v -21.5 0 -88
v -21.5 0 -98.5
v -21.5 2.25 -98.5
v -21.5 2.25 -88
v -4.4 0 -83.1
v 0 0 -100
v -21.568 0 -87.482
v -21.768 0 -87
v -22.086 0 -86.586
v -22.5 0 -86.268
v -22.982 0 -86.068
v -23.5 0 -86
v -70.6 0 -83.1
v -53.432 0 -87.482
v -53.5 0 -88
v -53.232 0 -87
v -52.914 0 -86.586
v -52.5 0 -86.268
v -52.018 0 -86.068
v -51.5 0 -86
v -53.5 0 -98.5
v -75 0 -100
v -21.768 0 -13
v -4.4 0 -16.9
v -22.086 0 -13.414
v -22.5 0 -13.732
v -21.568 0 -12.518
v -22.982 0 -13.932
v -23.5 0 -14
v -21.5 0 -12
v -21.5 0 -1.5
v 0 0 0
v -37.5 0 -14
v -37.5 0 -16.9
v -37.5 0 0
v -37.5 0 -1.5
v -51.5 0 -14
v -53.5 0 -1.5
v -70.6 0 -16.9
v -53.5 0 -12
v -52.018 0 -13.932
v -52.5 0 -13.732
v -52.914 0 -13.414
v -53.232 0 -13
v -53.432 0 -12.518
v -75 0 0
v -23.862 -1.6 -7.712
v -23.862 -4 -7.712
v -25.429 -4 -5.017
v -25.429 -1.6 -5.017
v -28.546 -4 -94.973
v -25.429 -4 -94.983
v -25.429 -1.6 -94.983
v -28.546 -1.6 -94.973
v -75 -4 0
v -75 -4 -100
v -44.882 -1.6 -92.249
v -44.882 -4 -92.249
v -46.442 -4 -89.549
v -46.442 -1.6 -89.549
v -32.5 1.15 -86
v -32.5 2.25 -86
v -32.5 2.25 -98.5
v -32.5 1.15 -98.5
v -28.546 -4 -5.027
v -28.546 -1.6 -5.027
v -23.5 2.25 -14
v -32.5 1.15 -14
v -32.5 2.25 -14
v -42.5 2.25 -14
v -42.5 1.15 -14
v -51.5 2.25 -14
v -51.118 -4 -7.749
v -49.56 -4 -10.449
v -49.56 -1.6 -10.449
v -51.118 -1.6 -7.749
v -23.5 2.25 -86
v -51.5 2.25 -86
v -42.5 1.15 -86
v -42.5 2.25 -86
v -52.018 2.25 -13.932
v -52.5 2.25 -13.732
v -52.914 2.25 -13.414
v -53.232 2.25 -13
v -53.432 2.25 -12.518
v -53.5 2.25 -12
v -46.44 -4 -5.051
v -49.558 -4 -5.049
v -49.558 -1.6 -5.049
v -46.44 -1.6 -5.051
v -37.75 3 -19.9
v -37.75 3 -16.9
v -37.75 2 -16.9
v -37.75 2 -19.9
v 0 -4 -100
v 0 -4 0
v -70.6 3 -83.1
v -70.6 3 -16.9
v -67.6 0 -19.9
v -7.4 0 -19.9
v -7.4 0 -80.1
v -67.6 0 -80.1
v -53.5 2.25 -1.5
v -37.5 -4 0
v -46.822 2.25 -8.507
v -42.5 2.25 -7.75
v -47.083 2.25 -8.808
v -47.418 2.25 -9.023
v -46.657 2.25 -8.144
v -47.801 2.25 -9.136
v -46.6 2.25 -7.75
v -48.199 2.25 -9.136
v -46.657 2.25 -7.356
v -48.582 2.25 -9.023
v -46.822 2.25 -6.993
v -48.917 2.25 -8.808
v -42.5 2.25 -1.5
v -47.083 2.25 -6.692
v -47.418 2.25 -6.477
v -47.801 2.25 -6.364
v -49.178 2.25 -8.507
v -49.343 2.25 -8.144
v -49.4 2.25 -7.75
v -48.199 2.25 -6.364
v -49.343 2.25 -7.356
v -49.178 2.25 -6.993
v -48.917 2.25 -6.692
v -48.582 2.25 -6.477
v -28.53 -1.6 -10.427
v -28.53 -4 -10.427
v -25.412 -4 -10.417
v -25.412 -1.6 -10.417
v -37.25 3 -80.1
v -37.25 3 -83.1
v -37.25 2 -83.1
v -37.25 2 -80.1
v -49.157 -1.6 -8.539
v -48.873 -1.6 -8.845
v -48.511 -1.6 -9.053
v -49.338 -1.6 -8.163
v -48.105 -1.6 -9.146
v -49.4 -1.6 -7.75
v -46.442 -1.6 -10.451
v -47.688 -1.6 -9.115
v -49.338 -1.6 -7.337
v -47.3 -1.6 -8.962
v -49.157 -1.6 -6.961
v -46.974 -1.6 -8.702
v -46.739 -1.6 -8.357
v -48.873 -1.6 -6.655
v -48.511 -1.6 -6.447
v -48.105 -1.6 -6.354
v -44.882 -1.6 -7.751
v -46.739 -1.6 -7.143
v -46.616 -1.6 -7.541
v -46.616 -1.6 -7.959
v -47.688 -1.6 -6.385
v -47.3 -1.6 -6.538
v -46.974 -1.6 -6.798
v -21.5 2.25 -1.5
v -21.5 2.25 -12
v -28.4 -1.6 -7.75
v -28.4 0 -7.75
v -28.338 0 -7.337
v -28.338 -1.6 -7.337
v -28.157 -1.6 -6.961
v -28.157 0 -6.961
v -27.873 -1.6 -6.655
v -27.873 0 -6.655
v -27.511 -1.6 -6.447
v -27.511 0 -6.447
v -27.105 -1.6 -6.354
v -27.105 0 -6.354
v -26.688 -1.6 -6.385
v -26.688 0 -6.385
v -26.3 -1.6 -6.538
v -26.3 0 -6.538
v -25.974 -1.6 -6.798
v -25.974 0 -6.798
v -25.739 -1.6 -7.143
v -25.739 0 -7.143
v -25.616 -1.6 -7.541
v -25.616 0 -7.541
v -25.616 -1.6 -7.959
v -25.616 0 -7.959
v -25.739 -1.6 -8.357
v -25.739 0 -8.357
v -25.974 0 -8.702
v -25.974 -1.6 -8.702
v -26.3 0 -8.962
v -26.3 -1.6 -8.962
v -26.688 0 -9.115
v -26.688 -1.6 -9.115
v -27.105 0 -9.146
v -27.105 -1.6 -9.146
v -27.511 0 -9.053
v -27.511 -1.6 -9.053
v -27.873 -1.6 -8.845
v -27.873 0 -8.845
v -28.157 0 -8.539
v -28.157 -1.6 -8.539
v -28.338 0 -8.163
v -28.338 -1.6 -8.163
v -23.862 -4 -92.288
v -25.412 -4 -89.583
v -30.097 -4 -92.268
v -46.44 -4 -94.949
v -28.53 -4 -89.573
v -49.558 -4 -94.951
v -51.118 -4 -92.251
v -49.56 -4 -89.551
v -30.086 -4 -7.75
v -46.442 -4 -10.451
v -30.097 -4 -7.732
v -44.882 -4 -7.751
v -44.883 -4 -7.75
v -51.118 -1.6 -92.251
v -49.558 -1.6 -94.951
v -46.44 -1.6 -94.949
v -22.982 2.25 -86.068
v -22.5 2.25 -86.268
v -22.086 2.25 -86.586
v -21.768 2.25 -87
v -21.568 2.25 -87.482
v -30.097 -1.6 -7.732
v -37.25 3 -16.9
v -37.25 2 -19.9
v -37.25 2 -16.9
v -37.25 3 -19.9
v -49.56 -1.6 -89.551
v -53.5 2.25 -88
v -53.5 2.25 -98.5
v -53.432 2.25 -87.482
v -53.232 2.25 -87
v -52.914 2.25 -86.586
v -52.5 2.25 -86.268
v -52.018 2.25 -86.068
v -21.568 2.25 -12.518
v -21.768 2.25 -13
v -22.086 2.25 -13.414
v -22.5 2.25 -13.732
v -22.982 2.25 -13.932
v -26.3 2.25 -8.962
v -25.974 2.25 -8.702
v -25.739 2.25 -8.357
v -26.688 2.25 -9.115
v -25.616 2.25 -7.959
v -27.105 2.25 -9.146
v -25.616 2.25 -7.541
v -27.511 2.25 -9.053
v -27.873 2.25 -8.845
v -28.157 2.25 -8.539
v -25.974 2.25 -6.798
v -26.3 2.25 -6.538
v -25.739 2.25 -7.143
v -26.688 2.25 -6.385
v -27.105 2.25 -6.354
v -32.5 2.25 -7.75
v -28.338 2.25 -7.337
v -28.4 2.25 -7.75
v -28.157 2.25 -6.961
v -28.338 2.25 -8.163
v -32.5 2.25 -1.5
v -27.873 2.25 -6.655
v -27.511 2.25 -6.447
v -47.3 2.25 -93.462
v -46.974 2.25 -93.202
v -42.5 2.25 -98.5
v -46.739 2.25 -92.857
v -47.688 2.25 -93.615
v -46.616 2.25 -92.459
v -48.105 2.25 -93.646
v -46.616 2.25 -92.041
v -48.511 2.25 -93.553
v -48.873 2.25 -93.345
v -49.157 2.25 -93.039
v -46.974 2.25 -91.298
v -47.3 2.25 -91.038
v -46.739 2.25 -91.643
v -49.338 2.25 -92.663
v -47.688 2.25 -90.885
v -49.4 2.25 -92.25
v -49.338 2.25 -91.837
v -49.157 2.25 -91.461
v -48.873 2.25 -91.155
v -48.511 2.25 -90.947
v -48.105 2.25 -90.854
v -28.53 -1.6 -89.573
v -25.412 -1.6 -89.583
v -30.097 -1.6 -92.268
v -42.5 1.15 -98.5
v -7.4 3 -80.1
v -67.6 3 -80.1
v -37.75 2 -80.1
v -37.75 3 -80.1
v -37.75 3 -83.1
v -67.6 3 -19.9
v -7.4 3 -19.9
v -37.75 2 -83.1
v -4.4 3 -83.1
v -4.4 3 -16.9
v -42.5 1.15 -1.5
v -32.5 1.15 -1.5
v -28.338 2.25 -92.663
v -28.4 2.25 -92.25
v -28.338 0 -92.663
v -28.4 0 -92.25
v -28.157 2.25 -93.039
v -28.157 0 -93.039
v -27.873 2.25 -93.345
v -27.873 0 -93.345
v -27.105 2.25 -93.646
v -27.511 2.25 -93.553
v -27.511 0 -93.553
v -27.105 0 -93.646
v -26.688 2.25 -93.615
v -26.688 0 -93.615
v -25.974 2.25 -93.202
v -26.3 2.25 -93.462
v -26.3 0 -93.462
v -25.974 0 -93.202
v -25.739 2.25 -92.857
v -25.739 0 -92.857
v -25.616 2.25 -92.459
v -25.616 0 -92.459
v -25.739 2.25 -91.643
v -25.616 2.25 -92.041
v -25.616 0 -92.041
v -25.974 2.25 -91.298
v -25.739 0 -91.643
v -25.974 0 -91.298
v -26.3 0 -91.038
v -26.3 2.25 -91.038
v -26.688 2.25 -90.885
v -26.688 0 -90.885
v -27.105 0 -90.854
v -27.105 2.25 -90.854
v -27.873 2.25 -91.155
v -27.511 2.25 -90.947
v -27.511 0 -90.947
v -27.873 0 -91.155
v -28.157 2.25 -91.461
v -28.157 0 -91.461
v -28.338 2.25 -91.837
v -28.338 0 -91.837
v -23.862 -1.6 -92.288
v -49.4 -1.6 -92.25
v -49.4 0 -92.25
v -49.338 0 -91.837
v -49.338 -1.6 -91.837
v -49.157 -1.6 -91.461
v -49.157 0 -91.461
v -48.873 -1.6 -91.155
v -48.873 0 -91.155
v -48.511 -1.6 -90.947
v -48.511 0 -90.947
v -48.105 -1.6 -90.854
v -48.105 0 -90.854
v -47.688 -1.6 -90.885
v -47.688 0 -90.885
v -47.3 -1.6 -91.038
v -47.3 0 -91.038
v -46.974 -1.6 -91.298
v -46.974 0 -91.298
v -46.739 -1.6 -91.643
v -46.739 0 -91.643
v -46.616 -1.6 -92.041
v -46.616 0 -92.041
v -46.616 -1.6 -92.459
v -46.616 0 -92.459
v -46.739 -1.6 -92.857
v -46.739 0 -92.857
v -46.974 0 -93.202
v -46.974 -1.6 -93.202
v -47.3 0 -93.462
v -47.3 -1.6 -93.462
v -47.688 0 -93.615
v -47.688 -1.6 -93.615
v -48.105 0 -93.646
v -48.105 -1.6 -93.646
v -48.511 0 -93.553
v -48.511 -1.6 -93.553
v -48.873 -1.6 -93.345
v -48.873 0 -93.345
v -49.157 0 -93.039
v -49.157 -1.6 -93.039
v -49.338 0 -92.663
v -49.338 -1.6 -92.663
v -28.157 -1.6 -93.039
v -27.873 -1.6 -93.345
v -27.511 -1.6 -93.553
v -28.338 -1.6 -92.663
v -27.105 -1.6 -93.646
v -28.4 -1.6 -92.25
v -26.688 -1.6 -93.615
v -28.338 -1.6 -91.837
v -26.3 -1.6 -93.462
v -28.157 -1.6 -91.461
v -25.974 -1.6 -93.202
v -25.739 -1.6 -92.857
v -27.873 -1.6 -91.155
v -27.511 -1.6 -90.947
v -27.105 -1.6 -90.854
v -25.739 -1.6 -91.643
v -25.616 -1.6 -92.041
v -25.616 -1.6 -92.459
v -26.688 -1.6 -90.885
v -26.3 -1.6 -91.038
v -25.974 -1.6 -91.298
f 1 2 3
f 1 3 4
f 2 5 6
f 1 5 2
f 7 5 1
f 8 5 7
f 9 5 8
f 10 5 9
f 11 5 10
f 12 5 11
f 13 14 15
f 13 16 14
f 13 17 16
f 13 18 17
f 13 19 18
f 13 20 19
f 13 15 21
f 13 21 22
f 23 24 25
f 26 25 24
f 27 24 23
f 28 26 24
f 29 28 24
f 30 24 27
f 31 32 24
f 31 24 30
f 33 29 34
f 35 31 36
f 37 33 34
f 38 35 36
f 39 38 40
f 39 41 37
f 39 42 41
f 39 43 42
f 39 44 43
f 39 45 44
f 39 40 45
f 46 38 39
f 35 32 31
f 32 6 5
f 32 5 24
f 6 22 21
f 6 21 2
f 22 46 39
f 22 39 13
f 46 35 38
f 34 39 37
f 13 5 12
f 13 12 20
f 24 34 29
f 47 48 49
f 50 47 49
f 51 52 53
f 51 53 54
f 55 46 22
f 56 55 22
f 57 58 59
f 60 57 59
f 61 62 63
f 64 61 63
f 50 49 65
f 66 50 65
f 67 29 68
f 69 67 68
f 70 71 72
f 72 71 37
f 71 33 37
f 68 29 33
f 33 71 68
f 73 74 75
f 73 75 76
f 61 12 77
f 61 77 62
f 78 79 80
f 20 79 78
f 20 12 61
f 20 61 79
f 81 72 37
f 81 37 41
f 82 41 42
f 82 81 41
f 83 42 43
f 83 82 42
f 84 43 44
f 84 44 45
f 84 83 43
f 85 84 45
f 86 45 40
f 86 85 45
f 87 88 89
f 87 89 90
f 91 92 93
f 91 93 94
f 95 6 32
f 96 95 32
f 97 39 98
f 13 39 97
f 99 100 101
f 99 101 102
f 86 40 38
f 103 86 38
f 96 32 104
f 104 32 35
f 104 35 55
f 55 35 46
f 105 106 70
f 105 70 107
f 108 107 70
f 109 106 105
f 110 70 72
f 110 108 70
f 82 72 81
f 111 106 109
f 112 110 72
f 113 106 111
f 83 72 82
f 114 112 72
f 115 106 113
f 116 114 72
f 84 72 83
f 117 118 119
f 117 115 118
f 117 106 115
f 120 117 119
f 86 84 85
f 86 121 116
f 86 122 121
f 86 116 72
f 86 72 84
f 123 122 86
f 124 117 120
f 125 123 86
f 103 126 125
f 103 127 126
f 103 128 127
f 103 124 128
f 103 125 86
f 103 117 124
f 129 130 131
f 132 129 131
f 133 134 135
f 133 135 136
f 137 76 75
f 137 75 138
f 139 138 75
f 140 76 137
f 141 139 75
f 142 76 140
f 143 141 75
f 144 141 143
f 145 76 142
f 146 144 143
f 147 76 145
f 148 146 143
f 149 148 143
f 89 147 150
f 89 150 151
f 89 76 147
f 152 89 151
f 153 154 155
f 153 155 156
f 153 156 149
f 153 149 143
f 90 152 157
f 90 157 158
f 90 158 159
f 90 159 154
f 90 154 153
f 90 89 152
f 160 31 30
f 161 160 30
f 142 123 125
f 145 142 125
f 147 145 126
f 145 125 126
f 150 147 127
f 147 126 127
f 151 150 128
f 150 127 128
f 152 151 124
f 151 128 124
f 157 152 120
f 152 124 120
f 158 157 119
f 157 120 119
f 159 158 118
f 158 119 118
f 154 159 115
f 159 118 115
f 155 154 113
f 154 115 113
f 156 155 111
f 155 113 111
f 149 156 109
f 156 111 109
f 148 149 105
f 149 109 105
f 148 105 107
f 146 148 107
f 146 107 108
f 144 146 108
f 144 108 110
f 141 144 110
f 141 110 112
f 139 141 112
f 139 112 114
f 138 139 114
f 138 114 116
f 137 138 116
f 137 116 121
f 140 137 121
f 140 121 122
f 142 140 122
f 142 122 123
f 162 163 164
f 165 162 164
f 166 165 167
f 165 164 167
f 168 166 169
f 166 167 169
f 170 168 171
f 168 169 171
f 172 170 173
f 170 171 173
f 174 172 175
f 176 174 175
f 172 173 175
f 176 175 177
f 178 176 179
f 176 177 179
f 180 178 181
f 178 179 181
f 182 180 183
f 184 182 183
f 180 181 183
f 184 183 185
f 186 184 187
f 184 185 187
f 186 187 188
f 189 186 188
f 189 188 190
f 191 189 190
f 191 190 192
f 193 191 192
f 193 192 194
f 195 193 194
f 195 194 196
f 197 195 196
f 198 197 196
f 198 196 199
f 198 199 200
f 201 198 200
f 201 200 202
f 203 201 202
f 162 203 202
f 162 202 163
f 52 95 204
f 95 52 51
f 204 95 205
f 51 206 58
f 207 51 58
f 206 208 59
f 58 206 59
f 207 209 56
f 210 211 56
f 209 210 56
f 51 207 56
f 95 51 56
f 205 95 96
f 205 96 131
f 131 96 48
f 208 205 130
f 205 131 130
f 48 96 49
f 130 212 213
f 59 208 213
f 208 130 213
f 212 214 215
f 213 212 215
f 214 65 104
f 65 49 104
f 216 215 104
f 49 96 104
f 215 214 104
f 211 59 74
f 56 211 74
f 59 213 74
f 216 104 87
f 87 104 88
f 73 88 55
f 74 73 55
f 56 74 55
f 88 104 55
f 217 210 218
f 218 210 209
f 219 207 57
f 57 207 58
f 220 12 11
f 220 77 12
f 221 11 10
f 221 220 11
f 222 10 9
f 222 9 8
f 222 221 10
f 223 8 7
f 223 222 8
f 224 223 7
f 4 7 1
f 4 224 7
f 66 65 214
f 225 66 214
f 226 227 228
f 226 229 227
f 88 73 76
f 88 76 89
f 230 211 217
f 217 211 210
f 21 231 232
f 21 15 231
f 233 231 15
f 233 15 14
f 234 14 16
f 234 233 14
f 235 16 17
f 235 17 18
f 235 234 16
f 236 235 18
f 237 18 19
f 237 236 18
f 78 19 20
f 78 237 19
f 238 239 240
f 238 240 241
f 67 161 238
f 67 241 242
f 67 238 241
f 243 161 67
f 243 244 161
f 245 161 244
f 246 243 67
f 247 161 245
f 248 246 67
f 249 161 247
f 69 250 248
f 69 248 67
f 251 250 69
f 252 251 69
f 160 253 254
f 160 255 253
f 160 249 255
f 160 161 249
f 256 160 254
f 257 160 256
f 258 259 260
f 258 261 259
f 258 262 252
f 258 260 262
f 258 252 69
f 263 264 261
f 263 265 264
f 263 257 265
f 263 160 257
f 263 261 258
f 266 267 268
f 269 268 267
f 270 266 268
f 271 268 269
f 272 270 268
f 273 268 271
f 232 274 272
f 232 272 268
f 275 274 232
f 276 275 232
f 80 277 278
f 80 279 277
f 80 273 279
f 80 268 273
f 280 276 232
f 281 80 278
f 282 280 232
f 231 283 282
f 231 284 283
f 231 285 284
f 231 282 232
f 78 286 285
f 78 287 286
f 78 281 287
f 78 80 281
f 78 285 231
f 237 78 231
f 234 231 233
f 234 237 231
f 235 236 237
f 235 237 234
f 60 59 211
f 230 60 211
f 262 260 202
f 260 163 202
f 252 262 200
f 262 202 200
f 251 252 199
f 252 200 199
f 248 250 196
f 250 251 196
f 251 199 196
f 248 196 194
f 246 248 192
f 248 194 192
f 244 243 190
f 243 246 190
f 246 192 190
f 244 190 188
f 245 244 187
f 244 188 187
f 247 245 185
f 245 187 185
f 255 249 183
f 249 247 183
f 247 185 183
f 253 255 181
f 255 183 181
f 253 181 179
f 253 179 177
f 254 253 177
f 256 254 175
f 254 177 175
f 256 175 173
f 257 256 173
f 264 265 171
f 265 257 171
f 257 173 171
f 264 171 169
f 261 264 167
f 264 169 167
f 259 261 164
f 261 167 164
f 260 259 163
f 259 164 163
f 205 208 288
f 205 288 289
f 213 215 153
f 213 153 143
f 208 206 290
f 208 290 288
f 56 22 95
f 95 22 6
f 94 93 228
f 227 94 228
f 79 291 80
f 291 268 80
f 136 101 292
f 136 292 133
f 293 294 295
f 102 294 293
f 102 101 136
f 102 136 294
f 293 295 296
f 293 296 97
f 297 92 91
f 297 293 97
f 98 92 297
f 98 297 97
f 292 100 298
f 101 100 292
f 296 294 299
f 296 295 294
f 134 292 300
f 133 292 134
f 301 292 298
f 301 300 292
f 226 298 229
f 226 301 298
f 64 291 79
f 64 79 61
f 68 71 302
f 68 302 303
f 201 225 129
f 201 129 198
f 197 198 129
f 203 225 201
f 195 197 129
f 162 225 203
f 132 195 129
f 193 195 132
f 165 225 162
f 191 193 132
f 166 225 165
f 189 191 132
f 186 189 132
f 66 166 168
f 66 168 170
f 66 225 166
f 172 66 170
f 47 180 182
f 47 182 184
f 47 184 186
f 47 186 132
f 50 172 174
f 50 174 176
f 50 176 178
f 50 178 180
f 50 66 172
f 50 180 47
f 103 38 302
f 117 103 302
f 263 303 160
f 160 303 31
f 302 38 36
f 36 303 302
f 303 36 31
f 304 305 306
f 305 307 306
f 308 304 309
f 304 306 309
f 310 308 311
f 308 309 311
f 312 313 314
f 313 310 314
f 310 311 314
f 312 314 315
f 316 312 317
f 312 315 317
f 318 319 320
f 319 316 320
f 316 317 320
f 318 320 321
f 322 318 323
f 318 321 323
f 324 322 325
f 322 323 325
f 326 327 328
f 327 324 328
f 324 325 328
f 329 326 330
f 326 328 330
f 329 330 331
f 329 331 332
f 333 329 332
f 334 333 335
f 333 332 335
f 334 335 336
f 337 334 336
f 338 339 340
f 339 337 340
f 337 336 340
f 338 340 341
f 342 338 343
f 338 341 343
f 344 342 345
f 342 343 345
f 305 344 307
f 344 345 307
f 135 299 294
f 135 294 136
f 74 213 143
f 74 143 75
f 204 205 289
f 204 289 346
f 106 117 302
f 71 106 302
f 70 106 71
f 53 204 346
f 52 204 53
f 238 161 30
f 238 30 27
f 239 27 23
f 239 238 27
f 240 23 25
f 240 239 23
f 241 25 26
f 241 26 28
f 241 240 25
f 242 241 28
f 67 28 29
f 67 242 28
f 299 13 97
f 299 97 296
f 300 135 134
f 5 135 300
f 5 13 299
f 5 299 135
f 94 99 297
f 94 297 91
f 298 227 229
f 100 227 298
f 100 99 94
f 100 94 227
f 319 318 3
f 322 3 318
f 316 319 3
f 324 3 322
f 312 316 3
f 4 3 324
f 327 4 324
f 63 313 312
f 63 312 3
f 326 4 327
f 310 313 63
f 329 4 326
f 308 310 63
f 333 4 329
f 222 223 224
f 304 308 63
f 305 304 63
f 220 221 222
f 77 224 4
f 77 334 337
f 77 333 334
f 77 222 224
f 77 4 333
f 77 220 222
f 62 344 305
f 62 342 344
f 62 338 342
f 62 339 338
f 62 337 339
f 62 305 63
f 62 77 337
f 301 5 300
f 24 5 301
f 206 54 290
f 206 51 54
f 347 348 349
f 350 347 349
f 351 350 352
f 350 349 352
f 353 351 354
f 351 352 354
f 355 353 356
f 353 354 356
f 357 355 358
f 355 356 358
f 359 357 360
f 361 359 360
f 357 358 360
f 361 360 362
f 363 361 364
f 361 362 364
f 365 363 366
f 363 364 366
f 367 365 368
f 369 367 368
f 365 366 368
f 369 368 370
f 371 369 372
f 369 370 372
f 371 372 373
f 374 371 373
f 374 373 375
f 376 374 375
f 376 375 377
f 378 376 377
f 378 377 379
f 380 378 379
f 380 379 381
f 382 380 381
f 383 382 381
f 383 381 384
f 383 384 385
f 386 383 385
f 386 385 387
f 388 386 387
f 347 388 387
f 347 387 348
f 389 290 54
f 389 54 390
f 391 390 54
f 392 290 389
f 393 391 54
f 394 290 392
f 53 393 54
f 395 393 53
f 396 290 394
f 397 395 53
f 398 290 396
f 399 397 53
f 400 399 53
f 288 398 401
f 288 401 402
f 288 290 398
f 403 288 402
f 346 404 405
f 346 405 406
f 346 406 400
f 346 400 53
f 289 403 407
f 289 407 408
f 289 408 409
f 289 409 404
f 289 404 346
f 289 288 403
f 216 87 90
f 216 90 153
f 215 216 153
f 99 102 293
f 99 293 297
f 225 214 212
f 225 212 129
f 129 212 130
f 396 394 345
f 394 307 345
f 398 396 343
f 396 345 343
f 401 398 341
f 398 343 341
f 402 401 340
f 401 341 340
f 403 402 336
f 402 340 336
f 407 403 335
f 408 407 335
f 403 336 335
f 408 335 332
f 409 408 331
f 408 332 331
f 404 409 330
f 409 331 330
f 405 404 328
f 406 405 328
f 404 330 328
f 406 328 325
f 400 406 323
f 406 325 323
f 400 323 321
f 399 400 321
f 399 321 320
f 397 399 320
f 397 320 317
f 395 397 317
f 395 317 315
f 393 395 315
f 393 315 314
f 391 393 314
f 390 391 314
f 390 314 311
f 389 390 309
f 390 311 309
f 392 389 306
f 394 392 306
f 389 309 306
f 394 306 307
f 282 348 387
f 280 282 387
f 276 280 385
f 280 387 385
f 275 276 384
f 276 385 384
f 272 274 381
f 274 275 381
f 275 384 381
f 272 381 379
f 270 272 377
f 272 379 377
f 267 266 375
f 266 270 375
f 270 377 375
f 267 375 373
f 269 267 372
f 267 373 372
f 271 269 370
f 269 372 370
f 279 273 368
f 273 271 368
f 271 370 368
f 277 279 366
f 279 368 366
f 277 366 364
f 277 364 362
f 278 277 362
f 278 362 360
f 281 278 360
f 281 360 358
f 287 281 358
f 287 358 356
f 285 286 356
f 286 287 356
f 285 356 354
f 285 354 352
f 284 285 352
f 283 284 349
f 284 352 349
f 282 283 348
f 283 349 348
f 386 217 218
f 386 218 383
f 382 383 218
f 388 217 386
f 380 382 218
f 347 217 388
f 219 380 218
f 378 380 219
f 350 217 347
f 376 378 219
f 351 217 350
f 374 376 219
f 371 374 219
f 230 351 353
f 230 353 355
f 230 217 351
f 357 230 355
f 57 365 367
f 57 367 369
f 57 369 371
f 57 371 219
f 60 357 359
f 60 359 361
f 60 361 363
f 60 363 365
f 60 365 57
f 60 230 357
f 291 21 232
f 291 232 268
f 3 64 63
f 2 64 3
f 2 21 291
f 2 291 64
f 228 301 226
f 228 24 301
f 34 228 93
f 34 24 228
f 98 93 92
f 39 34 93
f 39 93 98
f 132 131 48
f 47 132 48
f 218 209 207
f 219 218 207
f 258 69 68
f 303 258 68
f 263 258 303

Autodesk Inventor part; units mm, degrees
ref_plane "YZ Plane" through (0, 0, 0) normal (1, 0, 0) x (0, 1, 0)
ref_plane "XZ Plane" through (0, 0, 0) normal (0, 1, 0) x (-1, 0, 0)
ref_plane "XY Plane" through (0, 0, 0) normal (0, 0, 1) x (1, 0, 0)
sketch "Boceto1" plane through (0, 0, 0) normal (0, 1, 0) x (-1, 0, 0)
  line L0 (0, 0) -> (75, 0)
  line L1 (75, 0) -> (75, -100)
  line L2 (75, -100) -> (0, -100)
  line L3 (0, -100) -> (0, 0)
  line L4 (7.4, -80.1) -> (67.6, -80.1)
  line L5 (67.6, -80.1) -> (67.6, -19.9)
  line L6 (67.6, -19.9) -> (7.4, -19.9)
  line L7 (7.4, -19.9) -> (7.4, -80.1)
  line L8 (7.4, -80.1) -> (67.6, -19.9) construction
  line L9 (67.6, -80.1) -> (7.4, -19.9) construction
  line L10 (70.6, -16.9) -> (70.6, -83.1)
  line L11 (70.6, -83.1) -> (4.4, -83.1)
  line L12 (4.4, -83.1) -> (4.4, -16.9)
  line L13 (4.4, -16.9) -> (70.6, -16.9)
  line L14 (53.5, -1.5) -> (21.5, -1.5)
  line L15 (21.5, -1.5) -> (21.5, -14)
  line L16 (21.5, -14) -> (53.5, -14)
  line L17 (53.5, -14) -> (53.5, -1.5)
  line L18 (67.6, -50) -> (7.4, -50) construction
  line L19 (53.5, -7.75) -> (48, -7.75) construction
  line L20 (48, -7.75) -> (27, -7.75) construction
  line L21 (27, -7.75) -> (21.5, -7.75) construction
  circle A0 centre (48, -7.75) radius 1.4
  circle A1 centre (27, -7.75) radius 1.4
  line L22 (53.5, -98.5) -> (21.5, -98.5)
  line L23 (21.5, -98.5) -> (21.5, -86)
  line L24 (21.5, -86) -> (53.5, -86)
  line L25 (53.5, -86) -> (53.5, -98.5)
  circle A2 centre (48, -92.25) radius 1.4
  circle A3 centre (27, -92.25) radius 1.4
  line L26 (58.4347, 0) -> (58.4347, -14) construction
  line L27 (68.2, -14.5) -> (75, -14.5) construction
  line L28 (37.5, -19.9) -> (37.5, -80.1) construction
  circle A4 centre (48, -92.25) radius 1.4
  line L29 (48, -7.75) -> (27, -7.75)
  line L30 (37.5, -1.5) -> (37.5, 0)
  line L31 (37.5, -1.5) -> (37.5, -50)
  point P0 (37.5, -14)
  point P1 (37.5, -16.9)
  point P2 (37.5, -98.5)
  point P3 (37.5, -100)
  dimension "d0" = 100
  dimension "d1" = 75
  dimension "d2" = 60.2
  dimension "d3" = 60.2
  dimension "d4" = 3
  dimension "d5" = 12.5
  dimension "d6" = 32
  dimension "d8" = 5.5
  dimension "d9" = 5.5
  dimension "d10" = 2.8
  dimension "d11" = 2.8
  dimension "d14" = 14
  dimension "d32" = 1.5
  dimension "d36" = 1.5
extrude "Extrusión1" add sketch "Boceto1" along normal blind 3 contours L13 L10 L11 L12
extrude "Extrusión2" add sketch "Boceto1" against normal blind 4 contours L14 L17 L16 L31 | L31 L16 L15 L14 | L0 L1 L2 L3 | L22 L23 L24 L25
extrude "Extrusión3" add sketch "Boceto1" along normal blind 2.25 contours L14 L17 L16 L31 | L31 L16 L15 L14 | L22 L23 L24 L25
sketch "Boceto2" plane through (0, 2.25, 0) normal (0, 1, 0) x (1, 0, 0)
  line L0 (-53.5, 1.5) -> (-21.5, 1.5) projected
  line L1 (-37.5, 1.5) -> (-37.5, 14)
  line L2 (-21.5, 14) -> (-53.5, 14) projected
  line L3 (-32.5, 1.5) -> (-42.5, 1.5)
  line L4 (-42.5, 1.5) -> (-42.5, 14)
  line L5 (-42.5, 14) -> (-32.5, 14)
  line L6 (-32.5, 14) -> (-32.5, 1.5)
  line L7 (-32.5, 1.5) -> (-42.5, 14) construction
  line L8 (-42.5, 1.5) -> (-32.5, 14) construction
  line L9 (-67.6, 50) -> (-7.4, 50) construction
  line L10 (-53.5, 98.5) -> (-21.5, 98.5)
  line L11 (-21.5, 86) -> (-53.5, 86)
  line L12 (-42.5, 98.5) -> (-42.5, 86)
  line L13 (-32.5, 86) -> (-32.5, 98.5)
  point P0 (0, 0)
  point P1 (-37.5, 7.75)
  point P2 (-42.5, 98.5)
  point P3 (-42.5, 1.5)
  point P4 (-32.5, 1.5)
  point P5 (-32.5, 14)
  dimension "d22" = 10
extrude "Extrusión4" cut sketch "Boceto2" against normal blind 1.1
extrude "Extrusión5" add sketch "Boceto1" against normal blind 4 contours L6 L5 L4 L7 | L13 L10 L11 L12
sketch "Boceto3" plane through (0, 3, 0) normal (0, 1, 0) x (1, 0, 0)
  line L0 (-37.5, 19.9) -> (-37.5, 80.1) construction
  line L1 (-70.6, 16.9) -> (-4.4, 16.9) projected
  line L2 (-37.5, 16.9) -> (-37.5, 83.1)
  line L3 (-4.4, 83.1) -> (-70.6, 83.1) projected
  line L4 (-37.25, 16.9) -> (-37.75, 16.9)
  line L5 (-37.75, 16.9) -> (-37.75, 83.1)
  line L6 (-37.75, 83.1) -> (-37.25, 83.1)
  line L7 (-37.25, 83.1) -> (-37.25, 16.9)
  line L8 (-37.25, 16.9) -> (-37.75, 83.1) construction
  line L9 (-37.75, 16.9) -> (-37.25, 83.1) construction
  point P0 (0, 0)
  point P1 (-37.5, 50)
  point P2 (-37.25, 16.9)
  point P3 (-37.25, 83.1)
  point P4 (-37.75, 16.9)
  dimension "d27" = 0.5
extrude "Extrusión6" cut sketch "Boceto3" against normal blind 1
sketch "Boceto4" plane through (-53.5, 0, -1.5) normal (0, 0, 1) x (1, 0, 0)
  line L0 (16.25, 2) -> (15.75, 2) projected
  line L1 (21, 1.15) -> (11, 1.15) projected
  line L2 (-21.5, 0) -> (53.5, 0) projected
  line L3 (15.75, 2) -> (15.75, 3) projected
fillet "Empalme1" radius 2 4 edges at (-53.5, 1.125, -86) (-21.5, 1.125, -86) (-21.5, 1.125, -14) (-53.5, 1.125, -14)
sketch "Boceto5" plane through (-53.5, 0, -1.5) normal (0, 0, 1) x (1, 0, 0)
  line L0 (16.25, 2) -> (15.75, 2) projected
  line L1 (21, 1.15) -> (11, 1.15) projected
  point P0 (53.5, 0)
sketch "Boceto6" plane through (0, -4, 0) normal (0, -1, 0) x (1, 0, 0)
  line L0 (-27, -7.75) -> (-21.5, -7.75) construction
  circle A0 centre (-48, -7.75) radius 1.4 projected
  line L1 (-46.4401, -5.0506) -> (-44.8823, -7.7512)
  line L2 (-44.8823, -7.7512) -> (-46.4422, -10.4506)
  line L3 (-46.4422, -10.4506) -> (-49.5599, -10.4494)
  line L4 (-49.5599, -10.4494) -> (-51.1177, -7.7488)
  line L5 (-51.1177, -7.7488) -> (-49.5578, -5.0494)
  line L6 (-49.5578, -5.0494) -> (-46.4401, -5.0506)
  line L7 (0, 0) -> (-75, 0) projected
  line L8 (-37.5, 0) -> (-37.3669, -100)
  line L9 (0, -100) -> (-75, -100) projected
  line L10 (-75, 0) -> (-75, -100) projected
  line L11 (-75, -50) -> (0, -50)
  line L12 (0, -100) -> (0, 0) projected
  line L13 (-28.5465, -5.0268) -> (-30.0971, -7.7316)
  line L14 (-30.0971, -7.7316) -> (-28.53, -10.4268)
  line L15 (-28.53, -10.4268) -> (-25.4123, -10.4172)
  line L16 (-25.4123, -10.4172) -> (-23.8617, -7.7125)
  line L17 (-23.8617, -7.7125) -> (-25.4288, -5.0172)
  line L18 (-25.4288, -5.0172) -> (-28.5465, -5.0268)
  line L19 (-46.4401, -94.9494) -> (-44.8823, -92.2488)
  line L20 (-44.8823, -92.2488) -> (-46.4422, -89.5494)
  line L21 (-46.4422, -89.5494) -> (-49.5599, -89.5506)
  line L22 (-49.5599, -89.5506) -> (-51.1177, -92.2512)
  line L23 (-51.1177, -92.2512) -> (-49.5578, -94.9506)
  line L24 (-49.5578, -94.9506) -> (-46.4401, -94.9494)
  line L25 (-23.8617, -92.2875) -> (-25.4288, -94.9828)
  line L26 (-25.4288, -94.9828) -> (-28.5465, -94.9732)
  line L27 (-28.5465, -94.9732) -> (-30.0971, -92.2684)
  line L28 (-30.0971, -92.2684) -> (-28.53, -89.5732)
  line L29 (-28.53, -89.5732) -> (-25.4123, -89.5828)
  line L30 (-25.4123, -89.5828) -> (-23.8617, -92.2875)
  dimension "d37" = 5.4
extrude "Extrusión7" cut sketch "Boceto6" against normal blind 2.4 contours A0 | L1 L2 L3 L4 L5 L6 | L18 L17 L16 L15 L14 L13 | L24 L23 L22 L21 L20 L19 | L25 L26 L27 L28 L29 L30
equation "\"d9\" = d8"
properties part number "Molde 663FBR 1mm"
